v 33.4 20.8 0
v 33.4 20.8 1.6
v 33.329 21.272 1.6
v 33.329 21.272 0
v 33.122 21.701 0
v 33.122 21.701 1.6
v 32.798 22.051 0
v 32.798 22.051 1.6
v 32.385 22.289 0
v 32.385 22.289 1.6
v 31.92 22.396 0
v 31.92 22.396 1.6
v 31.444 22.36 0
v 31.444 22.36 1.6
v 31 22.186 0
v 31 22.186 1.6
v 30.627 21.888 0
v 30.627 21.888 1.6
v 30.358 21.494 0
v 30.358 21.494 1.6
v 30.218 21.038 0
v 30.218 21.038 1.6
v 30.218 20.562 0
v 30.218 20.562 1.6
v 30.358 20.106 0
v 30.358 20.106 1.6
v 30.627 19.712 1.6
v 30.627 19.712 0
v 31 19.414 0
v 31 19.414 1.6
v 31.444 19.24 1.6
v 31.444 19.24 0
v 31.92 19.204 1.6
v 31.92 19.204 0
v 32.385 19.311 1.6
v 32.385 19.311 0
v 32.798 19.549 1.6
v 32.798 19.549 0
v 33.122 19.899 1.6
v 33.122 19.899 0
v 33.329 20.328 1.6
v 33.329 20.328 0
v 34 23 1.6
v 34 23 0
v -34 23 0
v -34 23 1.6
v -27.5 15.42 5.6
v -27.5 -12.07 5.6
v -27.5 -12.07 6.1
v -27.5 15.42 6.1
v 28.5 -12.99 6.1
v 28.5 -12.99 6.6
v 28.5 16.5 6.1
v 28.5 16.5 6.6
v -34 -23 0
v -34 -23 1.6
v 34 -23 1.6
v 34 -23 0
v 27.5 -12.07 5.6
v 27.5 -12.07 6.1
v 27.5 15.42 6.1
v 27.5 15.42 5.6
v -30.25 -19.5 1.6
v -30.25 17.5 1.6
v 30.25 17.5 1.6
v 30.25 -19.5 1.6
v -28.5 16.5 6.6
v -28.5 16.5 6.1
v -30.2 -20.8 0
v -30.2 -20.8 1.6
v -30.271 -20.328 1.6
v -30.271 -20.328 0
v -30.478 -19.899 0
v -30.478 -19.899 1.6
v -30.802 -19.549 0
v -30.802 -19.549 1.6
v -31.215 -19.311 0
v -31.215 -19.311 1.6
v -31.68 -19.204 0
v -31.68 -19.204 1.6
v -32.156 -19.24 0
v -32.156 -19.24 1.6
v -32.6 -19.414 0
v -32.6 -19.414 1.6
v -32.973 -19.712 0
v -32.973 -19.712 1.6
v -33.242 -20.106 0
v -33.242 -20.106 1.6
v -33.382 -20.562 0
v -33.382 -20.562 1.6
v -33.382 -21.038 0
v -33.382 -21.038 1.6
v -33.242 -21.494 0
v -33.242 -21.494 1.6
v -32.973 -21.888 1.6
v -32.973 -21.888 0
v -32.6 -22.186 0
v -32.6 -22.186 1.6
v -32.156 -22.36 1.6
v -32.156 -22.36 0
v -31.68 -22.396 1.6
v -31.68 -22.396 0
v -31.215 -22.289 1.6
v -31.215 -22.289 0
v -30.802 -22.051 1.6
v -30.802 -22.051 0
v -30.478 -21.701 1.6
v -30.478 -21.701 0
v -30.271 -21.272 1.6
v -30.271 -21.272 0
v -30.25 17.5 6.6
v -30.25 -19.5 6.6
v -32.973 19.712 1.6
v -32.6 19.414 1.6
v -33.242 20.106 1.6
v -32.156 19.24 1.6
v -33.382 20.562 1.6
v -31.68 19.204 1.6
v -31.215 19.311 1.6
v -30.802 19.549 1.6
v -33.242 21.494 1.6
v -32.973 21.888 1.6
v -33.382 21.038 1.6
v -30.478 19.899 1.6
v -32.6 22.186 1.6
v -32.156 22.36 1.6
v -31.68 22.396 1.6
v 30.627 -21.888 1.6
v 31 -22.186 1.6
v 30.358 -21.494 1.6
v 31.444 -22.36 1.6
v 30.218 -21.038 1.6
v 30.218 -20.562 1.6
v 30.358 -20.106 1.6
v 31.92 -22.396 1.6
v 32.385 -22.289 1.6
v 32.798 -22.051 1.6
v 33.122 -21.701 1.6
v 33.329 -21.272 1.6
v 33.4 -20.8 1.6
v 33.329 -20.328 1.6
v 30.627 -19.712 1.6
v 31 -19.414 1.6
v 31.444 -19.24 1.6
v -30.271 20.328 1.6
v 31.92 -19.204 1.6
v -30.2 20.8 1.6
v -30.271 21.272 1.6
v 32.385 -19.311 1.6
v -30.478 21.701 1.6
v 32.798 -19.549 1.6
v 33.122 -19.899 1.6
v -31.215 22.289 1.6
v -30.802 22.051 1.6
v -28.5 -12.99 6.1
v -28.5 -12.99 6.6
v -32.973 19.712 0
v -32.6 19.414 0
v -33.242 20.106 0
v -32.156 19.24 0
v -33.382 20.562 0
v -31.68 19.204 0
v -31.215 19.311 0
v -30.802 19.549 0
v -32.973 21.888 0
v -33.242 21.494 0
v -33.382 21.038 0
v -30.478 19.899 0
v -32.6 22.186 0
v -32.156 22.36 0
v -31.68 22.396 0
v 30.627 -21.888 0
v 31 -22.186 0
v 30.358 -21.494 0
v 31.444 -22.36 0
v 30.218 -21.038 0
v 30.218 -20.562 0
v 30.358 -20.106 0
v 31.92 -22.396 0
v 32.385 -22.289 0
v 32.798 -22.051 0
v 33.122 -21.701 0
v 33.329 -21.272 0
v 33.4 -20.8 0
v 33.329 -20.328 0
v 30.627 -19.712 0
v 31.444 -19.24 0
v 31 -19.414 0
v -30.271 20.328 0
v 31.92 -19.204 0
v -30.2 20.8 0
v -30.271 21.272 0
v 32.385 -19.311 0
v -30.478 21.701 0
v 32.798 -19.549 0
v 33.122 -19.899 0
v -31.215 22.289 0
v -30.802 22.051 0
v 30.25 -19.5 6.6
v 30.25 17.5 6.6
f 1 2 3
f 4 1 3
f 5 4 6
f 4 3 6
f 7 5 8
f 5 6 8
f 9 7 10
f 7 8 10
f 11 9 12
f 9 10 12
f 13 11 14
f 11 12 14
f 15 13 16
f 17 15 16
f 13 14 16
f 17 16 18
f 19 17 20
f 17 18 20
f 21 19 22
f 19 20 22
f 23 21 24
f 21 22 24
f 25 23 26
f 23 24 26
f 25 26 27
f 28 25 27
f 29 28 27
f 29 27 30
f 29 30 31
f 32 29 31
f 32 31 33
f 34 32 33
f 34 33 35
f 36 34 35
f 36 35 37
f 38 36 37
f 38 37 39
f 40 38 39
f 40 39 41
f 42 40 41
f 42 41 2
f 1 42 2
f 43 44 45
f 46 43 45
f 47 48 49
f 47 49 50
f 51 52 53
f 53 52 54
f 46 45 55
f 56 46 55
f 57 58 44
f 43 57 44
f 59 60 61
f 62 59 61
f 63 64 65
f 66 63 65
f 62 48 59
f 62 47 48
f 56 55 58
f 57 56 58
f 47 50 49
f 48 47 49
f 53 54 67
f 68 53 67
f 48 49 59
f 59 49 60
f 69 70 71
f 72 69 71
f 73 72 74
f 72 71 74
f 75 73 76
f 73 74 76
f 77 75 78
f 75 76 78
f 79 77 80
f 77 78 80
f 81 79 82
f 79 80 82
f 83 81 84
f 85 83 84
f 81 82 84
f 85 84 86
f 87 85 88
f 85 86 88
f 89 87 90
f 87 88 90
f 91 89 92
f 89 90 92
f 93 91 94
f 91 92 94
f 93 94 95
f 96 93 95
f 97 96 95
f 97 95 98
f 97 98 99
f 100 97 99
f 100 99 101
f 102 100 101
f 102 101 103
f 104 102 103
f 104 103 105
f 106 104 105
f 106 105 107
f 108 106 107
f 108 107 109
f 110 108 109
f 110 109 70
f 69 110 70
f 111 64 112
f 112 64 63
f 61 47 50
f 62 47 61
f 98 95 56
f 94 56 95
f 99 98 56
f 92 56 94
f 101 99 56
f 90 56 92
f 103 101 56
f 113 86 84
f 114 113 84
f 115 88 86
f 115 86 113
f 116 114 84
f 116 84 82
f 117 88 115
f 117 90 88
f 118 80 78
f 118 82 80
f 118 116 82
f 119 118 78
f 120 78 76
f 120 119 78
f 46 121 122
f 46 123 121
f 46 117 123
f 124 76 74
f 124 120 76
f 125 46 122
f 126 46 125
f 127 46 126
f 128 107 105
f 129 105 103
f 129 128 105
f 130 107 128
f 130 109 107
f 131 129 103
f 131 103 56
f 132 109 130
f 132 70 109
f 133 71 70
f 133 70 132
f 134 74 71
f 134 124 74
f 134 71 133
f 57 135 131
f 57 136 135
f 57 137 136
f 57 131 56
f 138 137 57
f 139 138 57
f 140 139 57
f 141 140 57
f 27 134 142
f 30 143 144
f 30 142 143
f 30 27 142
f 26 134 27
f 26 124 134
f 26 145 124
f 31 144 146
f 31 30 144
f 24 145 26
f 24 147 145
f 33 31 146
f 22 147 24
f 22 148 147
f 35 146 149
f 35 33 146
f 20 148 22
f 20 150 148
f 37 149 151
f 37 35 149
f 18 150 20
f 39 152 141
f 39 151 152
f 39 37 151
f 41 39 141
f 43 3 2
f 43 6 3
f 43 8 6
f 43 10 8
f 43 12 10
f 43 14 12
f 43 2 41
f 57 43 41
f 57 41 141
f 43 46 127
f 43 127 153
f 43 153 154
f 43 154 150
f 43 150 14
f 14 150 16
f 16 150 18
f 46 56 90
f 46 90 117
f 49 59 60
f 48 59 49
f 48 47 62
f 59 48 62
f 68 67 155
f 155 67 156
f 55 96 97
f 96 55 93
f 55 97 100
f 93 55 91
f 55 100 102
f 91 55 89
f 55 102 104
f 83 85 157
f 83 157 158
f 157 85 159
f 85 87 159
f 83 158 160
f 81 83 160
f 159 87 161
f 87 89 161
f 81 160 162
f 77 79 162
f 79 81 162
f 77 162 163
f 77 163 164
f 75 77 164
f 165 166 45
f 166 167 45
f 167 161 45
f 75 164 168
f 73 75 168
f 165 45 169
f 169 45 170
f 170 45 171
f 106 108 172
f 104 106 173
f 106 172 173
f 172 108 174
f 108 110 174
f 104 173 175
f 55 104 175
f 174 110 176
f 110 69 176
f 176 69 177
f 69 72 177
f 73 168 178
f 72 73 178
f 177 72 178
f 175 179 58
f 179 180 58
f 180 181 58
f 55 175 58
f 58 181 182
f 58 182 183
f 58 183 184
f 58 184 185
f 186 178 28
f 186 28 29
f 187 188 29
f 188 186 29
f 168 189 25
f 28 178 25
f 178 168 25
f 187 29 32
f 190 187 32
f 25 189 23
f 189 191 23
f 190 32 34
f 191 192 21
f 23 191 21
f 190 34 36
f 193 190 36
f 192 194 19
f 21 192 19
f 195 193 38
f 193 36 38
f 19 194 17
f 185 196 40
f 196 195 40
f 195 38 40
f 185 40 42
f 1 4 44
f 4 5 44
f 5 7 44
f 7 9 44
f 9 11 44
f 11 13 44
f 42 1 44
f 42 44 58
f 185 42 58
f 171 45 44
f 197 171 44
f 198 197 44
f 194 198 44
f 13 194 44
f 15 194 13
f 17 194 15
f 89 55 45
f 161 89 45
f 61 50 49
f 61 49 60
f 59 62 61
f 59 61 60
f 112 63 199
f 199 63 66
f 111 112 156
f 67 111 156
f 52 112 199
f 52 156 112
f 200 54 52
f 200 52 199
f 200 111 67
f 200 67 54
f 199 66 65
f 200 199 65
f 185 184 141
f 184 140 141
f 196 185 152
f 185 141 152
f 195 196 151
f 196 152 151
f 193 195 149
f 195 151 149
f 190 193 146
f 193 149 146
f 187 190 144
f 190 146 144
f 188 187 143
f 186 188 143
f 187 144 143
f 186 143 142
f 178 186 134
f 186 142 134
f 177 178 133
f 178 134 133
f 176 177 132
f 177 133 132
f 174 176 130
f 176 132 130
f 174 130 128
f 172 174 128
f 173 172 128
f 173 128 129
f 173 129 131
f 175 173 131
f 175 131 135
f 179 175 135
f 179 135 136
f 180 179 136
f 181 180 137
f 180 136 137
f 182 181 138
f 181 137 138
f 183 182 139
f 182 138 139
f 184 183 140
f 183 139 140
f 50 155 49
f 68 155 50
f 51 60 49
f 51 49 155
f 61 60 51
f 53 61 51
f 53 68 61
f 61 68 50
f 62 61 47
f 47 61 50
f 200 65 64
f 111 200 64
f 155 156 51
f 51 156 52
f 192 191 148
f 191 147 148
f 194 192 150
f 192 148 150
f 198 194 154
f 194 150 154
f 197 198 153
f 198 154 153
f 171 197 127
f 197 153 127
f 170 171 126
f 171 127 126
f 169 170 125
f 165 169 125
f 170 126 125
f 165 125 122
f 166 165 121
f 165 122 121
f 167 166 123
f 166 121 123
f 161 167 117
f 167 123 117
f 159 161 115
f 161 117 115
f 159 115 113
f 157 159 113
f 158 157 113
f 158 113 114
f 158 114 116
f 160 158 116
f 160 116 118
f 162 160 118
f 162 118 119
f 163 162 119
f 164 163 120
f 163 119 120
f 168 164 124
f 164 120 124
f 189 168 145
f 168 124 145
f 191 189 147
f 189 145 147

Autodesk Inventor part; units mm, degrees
ref_plane "YZ Plane" through (0, 0, 0) normal (1, 0, 0) x (0, 1, 0)
ref_plane "XZ Plane" through (0, 0, 0) normal (0, 1, 0) x (-1, 0, 0)
ref_plane "XY Plane" through (0, 0, 0) normal (0, 0, 1) x (1, 0, 0)
sketch "Sketch1" plane through (0, 0, 0) normal (0, 0, 1) x (1, 0, 0)
  line L0 (-34, -23) -> (34, -23)
  line L1 (34, -23) -> (34, 23)
  line L2 (34, 23) -> (-34, 23)
  line L3 (-34, 23) -> (-34, -23)
  line L4 (-34, -23) -> (34, 23) construction
  line L5 (34, -23) -> (-34, 23) construction
  point P0 (0, 0)
  dimension "d0" = 68
  dimension "d1" = 46
extrude "Extrusion1" add sketch "Sketch1" along normal blind 1.6
sketch "Sketch2" plane through (0, 0, 1.6) normal (0, 0, 1) x (1, 0, 0)
  line L0 (-47.6, 0) -> (47.6, 0) construction
  line L1 (0, -32.2) -> (0, 32.2) construction
  circle A0 centre (-31.8, 20.8) radius 1.6
  line L2 (34, 23) -> (-34, 23) construction
  line L3 (-34, 23) -> (-34, -23) construction
  circle A1 centre (31.8, 20.8) radius 1.6
  circle A2 centre (-31.8, -20.8) radius 1.6
  line L4 (34, -23) -> (-34, -23) construction
  circle A3 centre (31.8, -20.8) radius 1.6
  point P0 (0, 0)
  dimension "d4" = 3.2
  dimension "d5" = 0.6
  dimension "d6" = 0.6
extrude "Extrusion2" cut sketch "Sketch2" against normal through all
sketch "Sketch3" plane through (0, 0, 1.6) normal (0, 0, 1) x (1, 0, 0)
  line L0 (0, 32.2) -> (0, -32.2) projected
  line L1 (-30.25, -19.5) -> (30.25, -19.5)
  line L2 (30.25, -19.5) -> (30.25, 17.5)
  line L3 (30.25, 17.5) -> (-30.25, 17.5)
  line L4 (-30.25, 17.5) -> (-30.25, -19.5)
  line L5 (-30.25, -19.5) -> (30.25, 17.5) construction
  line L6 (30.25, -19.5) -> (-30.25, 17.5) construction
  line L7 (-47.6, 0) -> (47.6, 0) projected
  point P0 (0, -1)
  dimension "d9" = 37
  dimension "d10" = 60.5
  dimension "d25" = 1
extrude "Extrusion3" add sketch "Sketch3" along normal blind 5 separate body
sketch "Sketch4" plane through (0, 0, 6.6) normal (0, 0, 1) x (1, 0, 0)
  line L0 (0, -32.2) -> (0, 32.2) projected
  line L1 (-28.5, -12.99) -> (28.5, -12.99)
  line L2 (28.5, -12.99) -> (28.5, 16.5)
  line L3 (28.5, 16.5) -> (-28.5, 16.5)
  line L4 (-28.5, 16.5) -> (-28.5, -12.99)
  line L5 (-28.5, -12.99) -> (28.5, 16.5) construction
  line L6 (28.5, -12.99) -> (-28.5, 16.5) construction
  line L7 (30.25, 17.5) -> (-30.25, 17.5) projected
  point P0 (0, 0)
  point P1 (0, 1.755)
  dimension "d13" = 29.49
  dimension "d14" = 57
  dimension "d15" = 1
extrude "Extrusion4" cut sketch "Sketch4" against normal blind 0.5 bodies 2
sketch "Sketch5" plane through (0, 0, 6.1) normal (0, 0, 1) x (1, 0, 0)
  line L0 (0, 32.2) -> (0, -32.2) projected
  line L1 (-27.5, -12.07) -> (27.5, -12.07)
  line L2 (27.5, -12.07) -> (27.5, 15.42)
  line L3 (27.5, 15.42) -> (-27.5, 15.42)
  line L4 (-27.5, 15.42) -> (-27.5, -12.07)
  line L5 (-27.5, -12.07) -> (27.5, 15.42) construction
  line L6 (27.5, -12.07) -> (-27.5, 15.42) construction
  line L7 (30.25, 17.5) -> (-30.25, 17.5) projected
  point P0 (0, 0)
  point P1 (0, 1.675)
  dimension "d18" = 27.49
  dimension "d19" = 55
  dimension "d20" = 2.08
extrude "Extrusion5" cut sketch "Sketch5" against normal blind 0.5 bodies 2
sketch "Sketch6" plane through (0, 0, 5.6) normal (0, 0, 1) x (1, 0, 0)
  line L0 (27.5, -12.07) -> (-27.5, -12.07) projected
  line L1 (27.5, 15.42) -> (27.5, -12.07) projected
  line L2 (-27.5, 15.42) -> (27.5, 15.42) projected
  line L3 (-27.5, -12.07) -> (-27.5, 15.42) projected
  point P0 (0, 0)
extrude "Extrusion6" add sketch "Sketch6" along normal blind 0.5 separate body
sketch "Sketch7" plane through (0, 0, 6.6) normal (0, 0, 1) x (1, 0, 0)
  circle A0 centre (0, 0) radius 6.7082
sketch "Sketch8" plane through (0, 0, 6.6) normal (0, 0, 1) x (1, 0, 0)
  circle A0 centre (0, 0) radius 4.3726
  line L0 (0, 0) -> (0, -28)
equation "\"d6\" = d5"
properties part number "Adafruit_2675"
